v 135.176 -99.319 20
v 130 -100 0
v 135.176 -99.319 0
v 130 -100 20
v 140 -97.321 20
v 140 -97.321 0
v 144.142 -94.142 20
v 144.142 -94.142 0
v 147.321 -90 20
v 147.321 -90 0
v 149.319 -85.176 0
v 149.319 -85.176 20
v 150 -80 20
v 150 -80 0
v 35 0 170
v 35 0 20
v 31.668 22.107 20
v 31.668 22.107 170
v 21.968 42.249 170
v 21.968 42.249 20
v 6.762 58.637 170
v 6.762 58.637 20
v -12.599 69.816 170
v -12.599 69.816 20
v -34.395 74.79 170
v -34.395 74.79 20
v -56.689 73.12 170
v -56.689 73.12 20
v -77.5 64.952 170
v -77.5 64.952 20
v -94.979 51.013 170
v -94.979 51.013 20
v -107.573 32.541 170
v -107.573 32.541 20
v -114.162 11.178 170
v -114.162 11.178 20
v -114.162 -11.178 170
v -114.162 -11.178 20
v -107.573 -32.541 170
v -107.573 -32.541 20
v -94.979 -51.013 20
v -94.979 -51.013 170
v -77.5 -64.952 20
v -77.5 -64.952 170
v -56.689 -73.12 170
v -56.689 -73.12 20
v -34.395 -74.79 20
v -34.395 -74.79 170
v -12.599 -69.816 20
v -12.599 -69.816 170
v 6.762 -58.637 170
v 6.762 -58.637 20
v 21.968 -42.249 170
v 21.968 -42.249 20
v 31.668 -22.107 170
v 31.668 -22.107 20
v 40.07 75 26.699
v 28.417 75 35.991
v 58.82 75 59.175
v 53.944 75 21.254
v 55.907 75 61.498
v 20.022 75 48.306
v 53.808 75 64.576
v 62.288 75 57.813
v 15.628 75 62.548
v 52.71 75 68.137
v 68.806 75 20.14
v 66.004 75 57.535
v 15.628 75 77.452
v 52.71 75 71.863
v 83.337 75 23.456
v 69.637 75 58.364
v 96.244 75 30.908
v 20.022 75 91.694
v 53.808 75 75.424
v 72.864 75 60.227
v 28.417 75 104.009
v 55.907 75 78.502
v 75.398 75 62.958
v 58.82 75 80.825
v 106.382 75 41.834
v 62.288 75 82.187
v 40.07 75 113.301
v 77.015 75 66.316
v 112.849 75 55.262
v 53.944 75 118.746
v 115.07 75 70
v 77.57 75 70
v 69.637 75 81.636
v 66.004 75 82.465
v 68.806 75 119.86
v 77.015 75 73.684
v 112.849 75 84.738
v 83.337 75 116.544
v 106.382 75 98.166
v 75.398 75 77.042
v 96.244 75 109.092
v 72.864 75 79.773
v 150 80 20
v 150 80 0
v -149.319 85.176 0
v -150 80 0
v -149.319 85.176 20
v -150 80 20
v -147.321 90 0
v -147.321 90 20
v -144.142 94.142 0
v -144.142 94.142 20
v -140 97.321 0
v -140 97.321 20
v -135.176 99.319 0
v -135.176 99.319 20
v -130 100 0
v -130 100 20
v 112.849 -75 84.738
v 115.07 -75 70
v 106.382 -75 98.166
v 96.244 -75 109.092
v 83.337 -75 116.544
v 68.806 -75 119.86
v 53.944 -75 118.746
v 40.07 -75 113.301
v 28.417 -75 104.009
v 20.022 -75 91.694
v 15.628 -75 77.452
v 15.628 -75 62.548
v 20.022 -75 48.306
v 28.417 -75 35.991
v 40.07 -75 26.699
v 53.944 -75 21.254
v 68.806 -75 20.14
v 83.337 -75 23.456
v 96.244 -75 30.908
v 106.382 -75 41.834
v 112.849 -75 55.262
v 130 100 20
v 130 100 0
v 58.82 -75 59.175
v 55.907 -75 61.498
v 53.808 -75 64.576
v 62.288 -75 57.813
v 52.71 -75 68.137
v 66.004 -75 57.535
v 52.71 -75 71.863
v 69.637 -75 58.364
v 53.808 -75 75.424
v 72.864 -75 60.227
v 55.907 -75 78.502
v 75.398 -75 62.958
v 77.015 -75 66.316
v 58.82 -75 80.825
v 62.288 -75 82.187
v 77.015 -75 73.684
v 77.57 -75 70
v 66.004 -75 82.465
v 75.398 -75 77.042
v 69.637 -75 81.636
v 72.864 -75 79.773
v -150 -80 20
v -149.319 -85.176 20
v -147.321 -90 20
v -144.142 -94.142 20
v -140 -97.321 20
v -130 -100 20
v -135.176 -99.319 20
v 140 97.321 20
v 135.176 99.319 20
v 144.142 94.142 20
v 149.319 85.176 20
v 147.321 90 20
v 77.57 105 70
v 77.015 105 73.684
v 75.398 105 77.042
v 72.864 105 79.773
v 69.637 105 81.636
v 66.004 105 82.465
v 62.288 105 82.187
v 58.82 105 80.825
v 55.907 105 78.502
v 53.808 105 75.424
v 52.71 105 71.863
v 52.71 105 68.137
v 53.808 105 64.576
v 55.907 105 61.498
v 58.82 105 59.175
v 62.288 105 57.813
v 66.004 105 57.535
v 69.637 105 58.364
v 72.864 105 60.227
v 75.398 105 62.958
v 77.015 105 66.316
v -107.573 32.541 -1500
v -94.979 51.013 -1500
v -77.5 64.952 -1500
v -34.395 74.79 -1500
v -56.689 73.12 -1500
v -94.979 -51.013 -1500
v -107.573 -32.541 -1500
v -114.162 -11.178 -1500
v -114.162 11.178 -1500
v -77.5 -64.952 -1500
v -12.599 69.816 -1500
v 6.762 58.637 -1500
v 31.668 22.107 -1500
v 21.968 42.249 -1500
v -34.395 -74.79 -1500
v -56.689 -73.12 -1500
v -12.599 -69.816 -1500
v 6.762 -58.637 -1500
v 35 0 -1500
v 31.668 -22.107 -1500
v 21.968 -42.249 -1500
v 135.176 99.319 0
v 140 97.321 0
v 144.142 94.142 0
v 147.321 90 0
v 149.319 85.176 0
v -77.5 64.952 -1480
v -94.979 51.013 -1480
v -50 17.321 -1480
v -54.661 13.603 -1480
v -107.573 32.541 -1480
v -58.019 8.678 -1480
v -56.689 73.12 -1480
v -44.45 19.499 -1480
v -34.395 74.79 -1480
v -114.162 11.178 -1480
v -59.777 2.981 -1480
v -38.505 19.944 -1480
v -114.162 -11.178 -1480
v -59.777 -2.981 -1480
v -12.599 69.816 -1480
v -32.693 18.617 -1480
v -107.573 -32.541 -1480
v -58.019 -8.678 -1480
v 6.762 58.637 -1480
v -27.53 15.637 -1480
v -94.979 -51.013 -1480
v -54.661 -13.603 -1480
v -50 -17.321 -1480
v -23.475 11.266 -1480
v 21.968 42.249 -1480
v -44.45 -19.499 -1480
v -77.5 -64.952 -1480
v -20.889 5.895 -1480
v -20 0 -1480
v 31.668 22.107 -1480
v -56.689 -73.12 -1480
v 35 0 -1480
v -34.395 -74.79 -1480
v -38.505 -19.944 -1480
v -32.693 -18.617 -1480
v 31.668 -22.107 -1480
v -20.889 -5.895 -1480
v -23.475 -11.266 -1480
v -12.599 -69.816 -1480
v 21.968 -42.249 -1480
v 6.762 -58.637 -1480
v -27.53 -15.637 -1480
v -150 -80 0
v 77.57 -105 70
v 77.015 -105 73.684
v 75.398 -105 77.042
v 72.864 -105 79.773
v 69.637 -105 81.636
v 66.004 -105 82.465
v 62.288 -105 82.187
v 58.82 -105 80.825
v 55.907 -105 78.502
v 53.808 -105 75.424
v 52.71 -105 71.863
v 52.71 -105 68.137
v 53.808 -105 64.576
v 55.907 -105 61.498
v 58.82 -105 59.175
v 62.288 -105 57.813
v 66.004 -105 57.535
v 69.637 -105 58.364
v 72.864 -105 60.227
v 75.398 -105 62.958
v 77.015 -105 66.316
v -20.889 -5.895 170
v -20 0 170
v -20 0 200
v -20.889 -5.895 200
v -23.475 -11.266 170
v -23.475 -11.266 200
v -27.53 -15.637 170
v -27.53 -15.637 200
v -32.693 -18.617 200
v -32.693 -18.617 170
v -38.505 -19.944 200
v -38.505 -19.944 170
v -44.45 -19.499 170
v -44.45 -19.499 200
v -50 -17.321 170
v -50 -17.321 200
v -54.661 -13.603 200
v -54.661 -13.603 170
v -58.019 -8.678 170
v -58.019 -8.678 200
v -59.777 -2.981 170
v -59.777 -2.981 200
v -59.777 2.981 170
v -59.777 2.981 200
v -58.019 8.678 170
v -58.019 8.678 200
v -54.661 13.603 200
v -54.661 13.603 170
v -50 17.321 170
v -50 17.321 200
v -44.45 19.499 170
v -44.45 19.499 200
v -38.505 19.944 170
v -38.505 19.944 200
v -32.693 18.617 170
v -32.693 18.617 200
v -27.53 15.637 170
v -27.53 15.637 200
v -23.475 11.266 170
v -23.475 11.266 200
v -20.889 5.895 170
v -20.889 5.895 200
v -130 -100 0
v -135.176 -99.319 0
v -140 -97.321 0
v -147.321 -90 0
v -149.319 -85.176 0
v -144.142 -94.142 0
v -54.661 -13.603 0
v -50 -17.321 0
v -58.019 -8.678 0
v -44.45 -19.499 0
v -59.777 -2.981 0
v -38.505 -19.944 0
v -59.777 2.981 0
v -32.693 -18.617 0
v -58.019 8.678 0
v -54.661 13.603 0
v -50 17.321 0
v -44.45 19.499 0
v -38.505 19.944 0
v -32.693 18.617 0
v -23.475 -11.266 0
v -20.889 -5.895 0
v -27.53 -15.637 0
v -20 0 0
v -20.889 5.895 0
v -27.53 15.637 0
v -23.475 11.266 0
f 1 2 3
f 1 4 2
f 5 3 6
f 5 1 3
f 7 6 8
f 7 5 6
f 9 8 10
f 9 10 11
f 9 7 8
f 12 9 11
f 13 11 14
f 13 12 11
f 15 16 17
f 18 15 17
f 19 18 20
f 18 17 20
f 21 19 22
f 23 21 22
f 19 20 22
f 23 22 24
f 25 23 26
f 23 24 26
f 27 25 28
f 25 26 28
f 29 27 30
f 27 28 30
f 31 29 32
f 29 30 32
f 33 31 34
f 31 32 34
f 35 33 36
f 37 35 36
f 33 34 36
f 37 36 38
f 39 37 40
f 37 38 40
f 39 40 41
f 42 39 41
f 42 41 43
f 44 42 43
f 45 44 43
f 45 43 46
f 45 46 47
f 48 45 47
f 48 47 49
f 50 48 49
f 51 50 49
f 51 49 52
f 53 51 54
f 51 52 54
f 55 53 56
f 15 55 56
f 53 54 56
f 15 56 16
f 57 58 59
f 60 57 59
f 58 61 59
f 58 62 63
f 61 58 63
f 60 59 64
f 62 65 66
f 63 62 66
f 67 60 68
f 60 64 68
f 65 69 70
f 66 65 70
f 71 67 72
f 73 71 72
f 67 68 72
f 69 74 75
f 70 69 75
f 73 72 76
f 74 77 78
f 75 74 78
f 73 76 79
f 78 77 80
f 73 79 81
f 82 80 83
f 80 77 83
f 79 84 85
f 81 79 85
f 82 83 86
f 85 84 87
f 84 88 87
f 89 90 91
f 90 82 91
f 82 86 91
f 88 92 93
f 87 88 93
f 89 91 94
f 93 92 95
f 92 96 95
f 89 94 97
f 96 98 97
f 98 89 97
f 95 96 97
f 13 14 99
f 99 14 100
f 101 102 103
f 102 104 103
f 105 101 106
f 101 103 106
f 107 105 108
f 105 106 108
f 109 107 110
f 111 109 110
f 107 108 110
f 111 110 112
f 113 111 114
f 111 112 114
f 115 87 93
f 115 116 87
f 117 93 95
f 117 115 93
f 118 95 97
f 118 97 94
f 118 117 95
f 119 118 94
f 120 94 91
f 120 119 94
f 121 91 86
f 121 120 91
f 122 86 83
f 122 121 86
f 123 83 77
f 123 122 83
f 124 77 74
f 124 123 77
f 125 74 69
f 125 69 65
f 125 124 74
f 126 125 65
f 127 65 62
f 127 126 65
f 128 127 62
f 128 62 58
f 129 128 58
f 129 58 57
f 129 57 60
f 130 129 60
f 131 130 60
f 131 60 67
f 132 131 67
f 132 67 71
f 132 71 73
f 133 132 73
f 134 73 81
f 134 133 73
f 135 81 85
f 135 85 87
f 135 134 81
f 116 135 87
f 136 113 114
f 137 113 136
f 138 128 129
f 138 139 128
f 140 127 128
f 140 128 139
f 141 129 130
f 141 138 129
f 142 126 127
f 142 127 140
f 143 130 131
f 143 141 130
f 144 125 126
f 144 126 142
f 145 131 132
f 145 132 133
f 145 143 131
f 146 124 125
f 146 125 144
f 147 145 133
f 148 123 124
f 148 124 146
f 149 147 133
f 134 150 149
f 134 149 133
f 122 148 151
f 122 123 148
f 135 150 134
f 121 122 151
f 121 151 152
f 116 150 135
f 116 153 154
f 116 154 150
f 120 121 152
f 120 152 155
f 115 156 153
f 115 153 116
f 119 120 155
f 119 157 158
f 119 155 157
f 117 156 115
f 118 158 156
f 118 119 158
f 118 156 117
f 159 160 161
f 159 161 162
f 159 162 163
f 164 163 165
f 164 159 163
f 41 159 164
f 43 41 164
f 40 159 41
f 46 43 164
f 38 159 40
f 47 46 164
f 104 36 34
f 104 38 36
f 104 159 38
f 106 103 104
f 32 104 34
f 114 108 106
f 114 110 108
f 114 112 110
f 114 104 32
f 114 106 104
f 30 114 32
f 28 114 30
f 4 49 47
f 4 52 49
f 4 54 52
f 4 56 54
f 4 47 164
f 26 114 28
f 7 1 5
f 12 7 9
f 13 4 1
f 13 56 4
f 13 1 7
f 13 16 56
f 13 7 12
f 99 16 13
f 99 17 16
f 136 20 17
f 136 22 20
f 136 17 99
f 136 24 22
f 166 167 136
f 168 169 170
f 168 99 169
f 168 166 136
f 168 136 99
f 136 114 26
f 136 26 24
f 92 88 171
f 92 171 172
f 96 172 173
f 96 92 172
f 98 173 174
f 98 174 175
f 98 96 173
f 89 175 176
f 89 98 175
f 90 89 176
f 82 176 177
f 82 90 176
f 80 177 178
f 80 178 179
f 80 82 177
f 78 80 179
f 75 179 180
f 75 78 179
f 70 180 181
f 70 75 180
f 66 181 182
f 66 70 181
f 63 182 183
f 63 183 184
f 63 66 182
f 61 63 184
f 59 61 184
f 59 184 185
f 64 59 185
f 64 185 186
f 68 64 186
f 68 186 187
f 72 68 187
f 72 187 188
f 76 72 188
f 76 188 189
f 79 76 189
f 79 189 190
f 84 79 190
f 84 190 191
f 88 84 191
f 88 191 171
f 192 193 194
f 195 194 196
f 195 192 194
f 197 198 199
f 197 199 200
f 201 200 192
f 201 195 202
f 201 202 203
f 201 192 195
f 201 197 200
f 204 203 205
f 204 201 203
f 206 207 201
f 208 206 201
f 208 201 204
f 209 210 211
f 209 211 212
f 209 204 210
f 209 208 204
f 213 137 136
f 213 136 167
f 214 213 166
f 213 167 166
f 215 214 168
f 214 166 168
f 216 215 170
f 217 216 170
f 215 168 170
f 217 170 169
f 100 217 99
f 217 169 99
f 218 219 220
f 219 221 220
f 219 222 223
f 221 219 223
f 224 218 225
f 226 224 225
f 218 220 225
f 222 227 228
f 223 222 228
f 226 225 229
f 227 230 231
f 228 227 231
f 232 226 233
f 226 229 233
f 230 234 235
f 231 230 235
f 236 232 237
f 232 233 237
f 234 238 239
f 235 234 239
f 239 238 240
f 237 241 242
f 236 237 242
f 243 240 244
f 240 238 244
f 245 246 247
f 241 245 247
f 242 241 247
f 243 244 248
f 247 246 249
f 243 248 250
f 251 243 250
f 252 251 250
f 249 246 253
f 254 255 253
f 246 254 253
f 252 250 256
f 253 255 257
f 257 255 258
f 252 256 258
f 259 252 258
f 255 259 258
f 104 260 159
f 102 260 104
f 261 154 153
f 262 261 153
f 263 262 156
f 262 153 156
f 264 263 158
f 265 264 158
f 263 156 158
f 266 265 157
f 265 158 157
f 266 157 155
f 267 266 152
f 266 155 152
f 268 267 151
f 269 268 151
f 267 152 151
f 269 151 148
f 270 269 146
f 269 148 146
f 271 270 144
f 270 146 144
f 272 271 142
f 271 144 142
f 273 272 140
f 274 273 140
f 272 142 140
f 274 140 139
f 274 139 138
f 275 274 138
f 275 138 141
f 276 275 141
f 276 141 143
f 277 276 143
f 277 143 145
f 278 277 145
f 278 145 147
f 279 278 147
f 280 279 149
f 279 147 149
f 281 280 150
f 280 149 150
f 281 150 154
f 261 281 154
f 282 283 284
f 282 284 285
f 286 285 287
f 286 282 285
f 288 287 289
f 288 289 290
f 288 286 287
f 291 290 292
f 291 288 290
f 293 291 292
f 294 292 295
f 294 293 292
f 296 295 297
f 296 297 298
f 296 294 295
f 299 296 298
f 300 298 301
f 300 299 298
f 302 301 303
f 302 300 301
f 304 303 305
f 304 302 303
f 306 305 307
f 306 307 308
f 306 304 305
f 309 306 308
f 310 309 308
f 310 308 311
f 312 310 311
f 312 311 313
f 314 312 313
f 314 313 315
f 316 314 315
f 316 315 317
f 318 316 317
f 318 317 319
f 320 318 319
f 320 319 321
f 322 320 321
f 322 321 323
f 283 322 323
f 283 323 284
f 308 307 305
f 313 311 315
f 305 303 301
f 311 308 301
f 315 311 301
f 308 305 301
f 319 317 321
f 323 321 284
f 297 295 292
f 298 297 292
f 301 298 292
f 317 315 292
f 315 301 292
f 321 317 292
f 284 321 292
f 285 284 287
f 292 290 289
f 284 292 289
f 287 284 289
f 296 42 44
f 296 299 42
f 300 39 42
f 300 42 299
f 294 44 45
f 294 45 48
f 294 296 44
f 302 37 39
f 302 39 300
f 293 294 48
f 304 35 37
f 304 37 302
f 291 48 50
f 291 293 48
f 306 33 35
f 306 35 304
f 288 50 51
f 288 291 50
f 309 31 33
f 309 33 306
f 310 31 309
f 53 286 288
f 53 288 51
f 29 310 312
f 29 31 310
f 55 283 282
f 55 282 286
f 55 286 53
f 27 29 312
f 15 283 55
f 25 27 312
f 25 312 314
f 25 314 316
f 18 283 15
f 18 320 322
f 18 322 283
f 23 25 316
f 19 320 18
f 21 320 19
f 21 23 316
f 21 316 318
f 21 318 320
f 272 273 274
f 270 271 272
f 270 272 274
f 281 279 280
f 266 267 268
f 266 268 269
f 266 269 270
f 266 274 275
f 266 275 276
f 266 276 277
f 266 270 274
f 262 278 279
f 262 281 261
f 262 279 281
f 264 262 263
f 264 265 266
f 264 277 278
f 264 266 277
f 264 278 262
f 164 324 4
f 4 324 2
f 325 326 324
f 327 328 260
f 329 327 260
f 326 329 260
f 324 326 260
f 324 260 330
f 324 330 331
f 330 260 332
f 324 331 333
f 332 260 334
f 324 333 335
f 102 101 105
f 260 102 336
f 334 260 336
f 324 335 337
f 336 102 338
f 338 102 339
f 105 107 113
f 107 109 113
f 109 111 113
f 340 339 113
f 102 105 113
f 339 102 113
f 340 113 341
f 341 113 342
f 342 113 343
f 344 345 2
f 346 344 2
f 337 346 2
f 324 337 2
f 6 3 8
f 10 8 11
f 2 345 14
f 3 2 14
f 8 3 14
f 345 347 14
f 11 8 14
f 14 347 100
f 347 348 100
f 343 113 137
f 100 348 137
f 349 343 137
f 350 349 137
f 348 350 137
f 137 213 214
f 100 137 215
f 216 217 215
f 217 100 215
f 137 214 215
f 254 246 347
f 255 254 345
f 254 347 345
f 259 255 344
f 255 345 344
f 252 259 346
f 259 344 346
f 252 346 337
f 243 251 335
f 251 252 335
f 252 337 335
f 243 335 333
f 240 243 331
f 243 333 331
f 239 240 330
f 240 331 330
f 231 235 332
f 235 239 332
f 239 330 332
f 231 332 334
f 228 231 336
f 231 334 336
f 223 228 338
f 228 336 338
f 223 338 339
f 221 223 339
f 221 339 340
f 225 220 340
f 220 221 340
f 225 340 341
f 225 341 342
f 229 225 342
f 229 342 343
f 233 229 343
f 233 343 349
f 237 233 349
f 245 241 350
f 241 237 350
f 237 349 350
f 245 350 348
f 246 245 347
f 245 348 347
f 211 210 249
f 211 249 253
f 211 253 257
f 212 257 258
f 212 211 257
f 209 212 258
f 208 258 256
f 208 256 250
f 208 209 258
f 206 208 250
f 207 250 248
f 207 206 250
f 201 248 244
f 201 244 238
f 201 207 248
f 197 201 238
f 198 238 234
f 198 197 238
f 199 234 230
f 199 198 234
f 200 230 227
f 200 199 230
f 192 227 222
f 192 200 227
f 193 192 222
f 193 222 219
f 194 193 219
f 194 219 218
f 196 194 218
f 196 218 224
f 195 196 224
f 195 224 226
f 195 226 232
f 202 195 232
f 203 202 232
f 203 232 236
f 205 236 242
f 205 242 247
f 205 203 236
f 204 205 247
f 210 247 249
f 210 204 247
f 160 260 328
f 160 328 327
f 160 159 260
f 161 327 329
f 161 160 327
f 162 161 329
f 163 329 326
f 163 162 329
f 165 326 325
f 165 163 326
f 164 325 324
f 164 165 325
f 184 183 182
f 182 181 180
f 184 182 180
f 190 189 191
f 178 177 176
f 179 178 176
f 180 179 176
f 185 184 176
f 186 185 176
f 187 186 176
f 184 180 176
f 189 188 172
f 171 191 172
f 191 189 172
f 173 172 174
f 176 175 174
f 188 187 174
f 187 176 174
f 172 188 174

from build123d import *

# Parameters (mm, degrees)
F0_W          = 300
F0_H          = 200
F1_DEPTH      = 20
F2_R          = 75
F3_DEPTH      = 150
F4_R          = 50
F5_DEPTH      = 75
F6_R          = 12.5
F7_DEPTH      = 30
F7_DEPTH_BACK = 180
F8_R          = 20
F9_DEPTH      = 1500
F9_DEPTH_BACK = 200
F10_R         = 75
F11_DEPTH     = 20
F12_R         = 20


with BuildPart() as f1:
    # F0 (on Top) → F1 (new body)
    with BuildSketch(Plane.XY):
        Rectangle(F0_W, F0_H)
    extrude(amount=F1_DEPTH)

    # F2 (on face) → F3 (join)
    with BuildSketch(Plane.XY.offset(20)):
        with Locations((-40, 0)):
            Circle(F2_R)
    extrude(amount=F3_DEPTH)

    # F8 (on face) → F9 (join, two sides)
    with BuildSketch(Plane(origin=(0, 0, 0), x_dir=(1, 0, 0), z_dir=(0, 0, -1))) as f9_sk:
        with Locations((-40, 0)):
            Circle(F8_R)
    extrude(amount=F9_DEPTH)
    extrude(f9_sk.sketch, amount=-F9_DEPTH_BACK)

    # F10 (on face) → F11 (join)
    with BuildSketch(Plane(origin=(0, 0, -1500), x_dir=(1, 0, 0), z_dir=(0, 0, -1))):
        with Locations((-40, 0)):
            Circle(F10_R)
    extrude(amount=-F11_DEPTH)

    # F12
    f12_edges = [f1.edges().sort_by_distance(p)[0] for p in [
        (150, 100, 10),
        (150, -100, 10),
        (-150, -100, 10),
        (-150, 100, 10),
    ]]
    fillet(f12_edges, radius=F12_R)


with BuildPart() as f5:
    # F4 (on Front) → F5 (new body, symmetric)
    with BuildSketch(Plane.XZ):
        with Locations((65.069951, 70)):
            Circle(F4_R)
    extrude(amount=F5_DEPTH, both=True)

    # F6 (on face) → F7 (join, two sides)
    with BuildSketch(Plane.XZ.offset(75)) as f7_sk:
        with Locations((65.069951, 70)):
            Circle(F6_R)
    extrude(amount=F7_DEPTH)
    extrude(f7_sk.sketch, amount=-F7_DEPTH_BACK)


solid = Compound([f1.part, f5.part])
